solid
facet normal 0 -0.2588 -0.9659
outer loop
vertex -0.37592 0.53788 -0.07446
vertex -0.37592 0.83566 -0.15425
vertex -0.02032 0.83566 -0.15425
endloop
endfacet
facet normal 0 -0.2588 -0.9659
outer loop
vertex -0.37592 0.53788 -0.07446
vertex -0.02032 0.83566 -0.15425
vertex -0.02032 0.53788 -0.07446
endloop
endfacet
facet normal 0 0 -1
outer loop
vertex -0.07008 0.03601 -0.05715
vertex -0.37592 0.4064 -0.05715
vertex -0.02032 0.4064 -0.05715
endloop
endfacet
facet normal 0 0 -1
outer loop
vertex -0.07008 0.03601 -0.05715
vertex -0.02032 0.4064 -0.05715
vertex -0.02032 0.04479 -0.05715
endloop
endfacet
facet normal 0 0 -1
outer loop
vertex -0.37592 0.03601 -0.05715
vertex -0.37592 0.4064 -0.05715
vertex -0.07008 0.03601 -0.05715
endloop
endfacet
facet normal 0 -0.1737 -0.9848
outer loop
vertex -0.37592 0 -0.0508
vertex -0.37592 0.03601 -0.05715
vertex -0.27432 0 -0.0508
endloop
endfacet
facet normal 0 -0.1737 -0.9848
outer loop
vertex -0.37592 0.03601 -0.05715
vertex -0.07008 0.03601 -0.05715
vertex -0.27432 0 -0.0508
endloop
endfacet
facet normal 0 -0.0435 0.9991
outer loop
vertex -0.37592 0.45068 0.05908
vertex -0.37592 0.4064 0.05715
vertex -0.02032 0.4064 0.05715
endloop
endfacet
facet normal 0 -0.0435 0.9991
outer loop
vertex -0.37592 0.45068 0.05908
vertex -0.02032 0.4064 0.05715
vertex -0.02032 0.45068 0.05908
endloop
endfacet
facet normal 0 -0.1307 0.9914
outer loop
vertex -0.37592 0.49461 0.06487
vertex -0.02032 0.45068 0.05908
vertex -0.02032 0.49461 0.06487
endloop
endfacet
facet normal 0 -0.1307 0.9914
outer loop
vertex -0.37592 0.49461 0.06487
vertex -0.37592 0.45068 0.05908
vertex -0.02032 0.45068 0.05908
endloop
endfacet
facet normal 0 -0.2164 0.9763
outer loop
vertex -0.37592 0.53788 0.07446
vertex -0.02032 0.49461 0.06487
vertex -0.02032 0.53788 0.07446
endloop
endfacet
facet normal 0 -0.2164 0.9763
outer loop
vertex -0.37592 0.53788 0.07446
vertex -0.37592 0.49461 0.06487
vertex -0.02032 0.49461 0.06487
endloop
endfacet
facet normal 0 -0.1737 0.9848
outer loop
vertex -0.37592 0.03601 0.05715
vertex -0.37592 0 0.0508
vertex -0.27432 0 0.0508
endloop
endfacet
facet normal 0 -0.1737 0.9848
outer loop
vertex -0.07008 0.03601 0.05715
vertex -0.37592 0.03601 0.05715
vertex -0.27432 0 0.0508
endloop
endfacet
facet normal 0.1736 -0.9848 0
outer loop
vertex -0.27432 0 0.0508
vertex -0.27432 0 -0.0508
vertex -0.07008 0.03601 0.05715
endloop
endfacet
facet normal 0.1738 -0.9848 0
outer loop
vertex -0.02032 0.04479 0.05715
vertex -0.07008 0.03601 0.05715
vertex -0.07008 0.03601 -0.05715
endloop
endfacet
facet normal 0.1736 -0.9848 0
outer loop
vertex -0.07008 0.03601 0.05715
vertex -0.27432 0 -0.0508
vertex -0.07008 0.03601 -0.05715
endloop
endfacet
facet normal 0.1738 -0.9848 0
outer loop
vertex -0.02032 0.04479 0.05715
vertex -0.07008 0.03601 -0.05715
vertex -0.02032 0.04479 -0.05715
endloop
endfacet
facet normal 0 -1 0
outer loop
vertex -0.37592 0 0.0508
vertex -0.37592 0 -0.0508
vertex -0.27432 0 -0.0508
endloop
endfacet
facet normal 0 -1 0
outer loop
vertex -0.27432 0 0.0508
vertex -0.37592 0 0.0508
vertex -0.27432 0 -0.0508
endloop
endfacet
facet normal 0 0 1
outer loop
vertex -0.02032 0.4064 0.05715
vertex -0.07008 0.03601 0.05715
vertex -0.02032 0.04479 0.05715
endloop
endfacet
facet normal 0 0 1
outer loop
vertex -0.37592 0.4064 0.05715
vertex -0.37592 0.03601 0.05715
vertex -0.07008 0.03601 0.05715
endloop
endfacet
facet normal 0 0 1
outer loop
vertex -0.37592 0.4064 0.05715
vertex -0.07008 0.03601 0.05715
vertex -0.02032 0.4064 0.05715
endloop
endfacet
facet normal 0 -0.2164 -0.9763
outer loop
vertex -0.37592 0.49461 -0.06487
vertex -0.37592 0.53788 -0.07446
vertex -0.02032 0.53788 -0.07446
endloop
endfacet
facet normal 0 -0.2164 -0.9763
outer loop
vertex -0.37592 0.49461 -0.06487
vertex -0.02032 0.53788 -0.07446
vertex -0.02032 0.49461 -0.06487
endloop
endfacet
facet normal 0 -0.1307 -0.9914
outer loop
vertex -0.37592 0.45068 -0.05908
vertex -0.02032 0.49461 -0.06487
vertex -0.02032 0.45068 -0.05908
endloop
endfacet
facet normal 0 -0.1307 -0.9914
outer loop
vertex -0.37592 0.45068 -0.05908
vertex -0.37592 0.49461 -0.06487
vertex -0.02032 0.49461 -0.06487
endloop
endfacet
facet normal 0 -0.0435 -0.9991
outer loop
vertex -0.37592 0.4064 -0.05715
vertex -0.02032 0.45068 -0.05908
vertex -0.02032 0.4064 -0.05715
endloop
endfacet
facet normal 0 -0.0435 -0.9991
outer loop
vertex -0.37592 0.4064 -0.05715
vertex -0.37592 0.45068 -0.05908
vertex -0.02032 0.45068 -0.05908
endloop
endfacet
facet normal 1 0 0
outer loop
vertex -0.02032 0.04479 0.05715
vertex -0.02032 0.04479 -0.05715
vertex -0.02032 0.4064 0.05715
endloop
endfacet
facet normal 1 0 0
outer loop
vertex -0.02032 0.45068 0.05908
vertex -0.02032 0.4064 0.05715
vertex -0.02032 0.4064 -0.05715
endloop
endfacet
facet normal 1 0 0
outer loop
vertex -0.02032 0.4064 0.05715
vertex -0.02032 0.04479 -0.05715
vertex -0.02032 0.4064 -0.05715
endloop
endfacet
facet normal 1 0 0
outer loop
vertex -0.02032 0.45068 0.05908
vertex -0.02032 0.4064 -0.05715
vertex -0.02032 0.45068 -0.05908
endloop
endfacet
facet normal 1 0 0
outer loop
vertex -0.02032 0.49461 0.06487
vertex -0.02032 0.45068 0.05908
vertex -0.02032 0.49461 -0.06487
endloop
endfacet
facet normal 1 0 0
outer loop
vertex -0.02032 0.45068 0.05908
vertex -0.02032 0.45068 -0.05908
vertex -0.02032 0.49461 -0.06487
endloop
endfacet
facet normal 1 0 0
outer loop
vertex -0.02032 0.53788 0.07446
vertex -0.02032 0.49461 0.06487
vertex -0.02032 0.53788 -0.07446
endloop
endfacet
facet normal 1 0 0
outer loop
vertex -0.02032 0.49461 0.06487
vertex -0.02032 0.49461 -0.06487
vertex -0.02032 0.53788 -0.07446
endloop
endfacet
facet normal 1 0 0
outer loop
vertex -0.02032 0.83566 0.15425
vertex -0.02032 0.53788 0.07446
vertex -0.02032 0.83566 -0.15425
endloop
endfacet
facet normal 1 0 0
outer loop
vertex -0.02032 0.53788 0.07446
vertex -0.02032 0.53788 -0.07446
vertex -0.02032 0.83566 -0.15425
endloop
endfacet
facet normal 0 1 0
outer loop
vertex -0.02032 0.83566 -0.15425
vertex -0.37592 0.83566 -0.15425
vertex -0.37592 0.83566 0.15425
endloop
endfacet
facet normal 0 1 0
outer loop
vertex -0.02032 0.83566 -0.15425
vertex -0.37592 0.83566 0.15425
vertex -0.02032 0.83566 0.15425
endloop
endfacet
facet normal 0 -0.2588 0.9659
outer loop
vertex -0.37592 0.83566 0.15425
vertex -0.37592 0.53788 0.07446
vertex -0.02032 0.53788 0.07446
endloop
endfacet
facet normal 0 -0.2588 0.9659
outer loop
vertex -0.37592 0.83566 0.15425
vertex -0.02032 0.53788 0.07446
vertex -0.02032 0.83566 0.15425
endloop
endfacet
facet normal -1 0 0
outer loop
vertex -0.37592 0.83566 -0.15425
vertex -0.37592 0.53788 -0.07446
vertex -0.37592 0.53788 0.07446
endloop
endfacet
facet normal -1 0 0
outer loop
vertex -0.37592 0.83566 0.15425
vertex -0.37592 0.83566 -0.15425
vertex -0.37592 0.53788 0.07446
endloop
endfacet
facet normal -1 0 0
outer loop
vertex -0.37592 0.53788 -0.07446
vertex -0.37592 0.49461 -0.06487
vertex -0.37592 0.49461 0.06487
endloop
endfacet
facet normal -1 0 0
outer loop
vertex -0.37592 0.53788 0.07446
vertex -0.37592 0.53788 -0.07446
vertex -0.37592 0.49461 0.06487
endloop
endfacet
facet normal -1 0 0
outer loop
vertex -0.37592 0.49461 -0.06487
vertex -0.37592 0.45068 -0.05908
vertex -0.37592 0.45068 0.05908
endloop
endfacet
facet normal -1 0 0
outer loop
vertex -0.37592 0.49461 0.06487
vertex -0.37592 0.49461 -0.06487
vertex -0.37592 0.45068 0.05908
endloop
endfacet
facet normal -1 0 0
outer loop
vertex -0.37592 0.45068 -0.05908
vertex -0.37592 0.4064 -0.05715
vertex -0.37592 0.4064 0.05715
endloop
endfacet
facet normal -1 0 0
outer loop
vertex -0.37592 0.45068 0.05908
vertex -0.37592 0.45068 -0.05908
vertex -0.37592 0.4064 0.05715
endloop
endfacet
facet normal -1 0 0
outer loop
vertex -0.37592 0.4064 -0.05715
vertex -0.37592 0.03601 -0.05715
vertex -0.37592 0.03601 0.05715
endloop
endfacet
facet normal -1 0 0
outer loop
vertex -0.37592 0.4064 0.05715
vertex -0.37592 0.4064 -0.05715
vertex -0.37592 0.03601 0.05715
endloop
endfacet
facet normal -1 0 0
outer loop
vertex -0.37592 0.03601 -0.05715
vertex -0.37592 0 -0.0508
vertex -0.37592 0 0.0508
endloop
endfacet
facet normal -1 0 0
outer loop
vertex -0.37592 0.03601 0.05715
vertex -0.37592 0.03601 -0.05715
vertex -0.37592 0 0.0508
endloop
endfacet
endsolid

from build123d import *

# Parameters (mm, degrees)
TD_STD_FEATURE_DEPTH       = 21.0312
ISA_STD_FEATURE_DEPTH      = 22.061040395
ISA_STD_FEATURE_DEPTH_BACK = 22.061040395
BA_STD_FEATURE_DEPTH       = 22.061040395
BA_STD_FEATURE_DEPTH_BACK  = 22.061040395
VR_STD_FEATURE_DEPTH       = 22.061040395
VR_STD_FEATURE_DEPTH_BACK  = 22.061040395
SLB_STD_FEATURE_DEPTH      = 22.061040395
SLB_STD_FEATURE_DEPTH_BACK = 22.061040395


with BuildPart() as part:
    # td_std_sketch → td_std_feature (new body)
    with BuildSketch(Plane(origin=(0, 0, 0), x_dir=(1, 0, 0), z_dir=(0, 1, 0))):
        with BuildLine():
            Line((-0.37592, 0.697645113), (-0.37592, -0.697645113))
            ThreePointArc((-0.37592, -0.697645113), (0.79248, 0), (-0.37592, 0.697645113))
        make_face()
    extrude(amount=TD_STD_FEATURE_DEPTH)

    # isa_std_sketch → isa_std_feature (cut, two sides: drawn at the far end of the back side and taken through both)
    with BuildSketch(Plane(origin=(0, 0, 0), x_dir=(0, 0, -1), z_dir=(1, 0, 0)).offset(-ISA_STD_FEATURE_DEPTH_BACK)):
        Polygon((8.398066277, 47.339699483), (0.79248, 4.2062763), (0.0508, 0), (-0.0508, 0), (-0.79248, 4.2062763), (-8.398066277, 47.339699483), (-8.398066277, -40.25795204), (8.398066277, -40.25795204), align=None)
    extrude(amount=ISA_STD_FEATURE_DEPTH + ISA_STD_FEATURE_DEPTH_BACK, mode=Mode.SUBTRACT)

    # ba_std_sketch → ba_std_feature (cut, two sides: drawn at the far end of the back side and taken through both)
    with BuildSketch(Plane.XY.offset(-BA_STD_FEATURE_DEPTH_BACK)):
        Polygon((-51.59903187, -9.04993148), (-0.27432, 0), (-0.012169423, 0.04622422), (0.79248, 4.609617863), (9.84241148, 55.934329733), (85.581906017, -15.675992153), (24.140462667, -80.660253365), align=None)
    extrude(amount=BA_STD_FEATURE_DEPTH + BA_STD_FEATURE_DEPTH_BACK, mode=Mode.SUBTRACT)

    # vr_std_sketch → vr_std_feature (cut, two sides: drawn at the far end of the back side and taken through both)
    with BuildSketch(Plane(origin=(0, 0, 0), x_dir=(0, 0, -1), z_dir=(1, 0, 0)).offset(-VR_STD_FEATURE_DEPTH_BACK)):
        with BuildLine():
            Line((12.638111697, 47.42606773), (0.79248, 3.217568389))
            Line((0.79248, 3.217568389), (0.07445968, 0.537880075))
            ThreePointArc((0.07445968, 0.537880075), (0.06149601, 0.472707306), (0.05715, 0.4064))
            Line((0.05715, 0.4064), (0.05715, 0))
            Line((0.05715, 0), (-0.05715, 0))
            Line((-0.05715, 0), (-0.05715, 0.4064))
            ThreePointArc((-0.05715, 0.4064), (-0.06149601, 0.472707306), (-0.07445968, 0.537880075))
            Line((-0.07445968, 0.537880075), (-0.79248, 3.217568389))
            Line((-0.79248, 3.217568389), (-12.638111697, 47.42606773))
            Line((-12.638111697, 47.42606773), (-12.638111697, -44.109944949))
            Line((-12.638111697, -44.109944949), (12.638111697, -44.109944949))
            Line((12.638111697, -44.109944949), (12.638111697, 47.42606773))
        make_face()
    extrude(amount=VR_STD_FEATURE_DEPTH + VR_STD_FEATURE_DEPTH_BACK, mode=Mode.SUBTRACT)

    # slb_std_sketch → slb_std_feature (cut, two sides: drawn at the far end of the back side and taken through both)
    with BuildSketch(Plane.XY.offset(-SLB_STD_FEATURE_DEPTH_BACK)):
        with BuildLine():
            Line((-0.02032, -52.09380084), (-0.02032, 0))
            Line((-0.02032, 0), (-0.02032, 1.143))
            ThreePointArc((-0.02032, 1.143), (-0.018386907, 1.187275117), (-0.012602339, 1.231213274))
            Line((-0.012602339, 1.231213274), (0.79248, 5.797062104))
            Line((0.79248, 5.797062104), (9.838473584, 57.099441055))
            Line((9.838473584, 57.099441055), (113.603993376, 47.730703366))
            Line((113.603993376, 47.730703366), (103.745199792, -61.462538529))
            Line((103.745199792, -61.462538529), (-0.02032, -52.09380084))
        make_face()
    extrude(amount=SLB_STD_FEATURE_DEPTH + SLB_STD_FEATURE_DEPTH_BACK, mode=Mode.SUBTRACT)

    # std_right_cut
    split(bisect_by=Plane(origin=(0, 0.83566, 0), x_dir=(1, 0, 0), z_dir=(0, 1, 0)), keep=Keep.BOTTOM)


solid = part.part
